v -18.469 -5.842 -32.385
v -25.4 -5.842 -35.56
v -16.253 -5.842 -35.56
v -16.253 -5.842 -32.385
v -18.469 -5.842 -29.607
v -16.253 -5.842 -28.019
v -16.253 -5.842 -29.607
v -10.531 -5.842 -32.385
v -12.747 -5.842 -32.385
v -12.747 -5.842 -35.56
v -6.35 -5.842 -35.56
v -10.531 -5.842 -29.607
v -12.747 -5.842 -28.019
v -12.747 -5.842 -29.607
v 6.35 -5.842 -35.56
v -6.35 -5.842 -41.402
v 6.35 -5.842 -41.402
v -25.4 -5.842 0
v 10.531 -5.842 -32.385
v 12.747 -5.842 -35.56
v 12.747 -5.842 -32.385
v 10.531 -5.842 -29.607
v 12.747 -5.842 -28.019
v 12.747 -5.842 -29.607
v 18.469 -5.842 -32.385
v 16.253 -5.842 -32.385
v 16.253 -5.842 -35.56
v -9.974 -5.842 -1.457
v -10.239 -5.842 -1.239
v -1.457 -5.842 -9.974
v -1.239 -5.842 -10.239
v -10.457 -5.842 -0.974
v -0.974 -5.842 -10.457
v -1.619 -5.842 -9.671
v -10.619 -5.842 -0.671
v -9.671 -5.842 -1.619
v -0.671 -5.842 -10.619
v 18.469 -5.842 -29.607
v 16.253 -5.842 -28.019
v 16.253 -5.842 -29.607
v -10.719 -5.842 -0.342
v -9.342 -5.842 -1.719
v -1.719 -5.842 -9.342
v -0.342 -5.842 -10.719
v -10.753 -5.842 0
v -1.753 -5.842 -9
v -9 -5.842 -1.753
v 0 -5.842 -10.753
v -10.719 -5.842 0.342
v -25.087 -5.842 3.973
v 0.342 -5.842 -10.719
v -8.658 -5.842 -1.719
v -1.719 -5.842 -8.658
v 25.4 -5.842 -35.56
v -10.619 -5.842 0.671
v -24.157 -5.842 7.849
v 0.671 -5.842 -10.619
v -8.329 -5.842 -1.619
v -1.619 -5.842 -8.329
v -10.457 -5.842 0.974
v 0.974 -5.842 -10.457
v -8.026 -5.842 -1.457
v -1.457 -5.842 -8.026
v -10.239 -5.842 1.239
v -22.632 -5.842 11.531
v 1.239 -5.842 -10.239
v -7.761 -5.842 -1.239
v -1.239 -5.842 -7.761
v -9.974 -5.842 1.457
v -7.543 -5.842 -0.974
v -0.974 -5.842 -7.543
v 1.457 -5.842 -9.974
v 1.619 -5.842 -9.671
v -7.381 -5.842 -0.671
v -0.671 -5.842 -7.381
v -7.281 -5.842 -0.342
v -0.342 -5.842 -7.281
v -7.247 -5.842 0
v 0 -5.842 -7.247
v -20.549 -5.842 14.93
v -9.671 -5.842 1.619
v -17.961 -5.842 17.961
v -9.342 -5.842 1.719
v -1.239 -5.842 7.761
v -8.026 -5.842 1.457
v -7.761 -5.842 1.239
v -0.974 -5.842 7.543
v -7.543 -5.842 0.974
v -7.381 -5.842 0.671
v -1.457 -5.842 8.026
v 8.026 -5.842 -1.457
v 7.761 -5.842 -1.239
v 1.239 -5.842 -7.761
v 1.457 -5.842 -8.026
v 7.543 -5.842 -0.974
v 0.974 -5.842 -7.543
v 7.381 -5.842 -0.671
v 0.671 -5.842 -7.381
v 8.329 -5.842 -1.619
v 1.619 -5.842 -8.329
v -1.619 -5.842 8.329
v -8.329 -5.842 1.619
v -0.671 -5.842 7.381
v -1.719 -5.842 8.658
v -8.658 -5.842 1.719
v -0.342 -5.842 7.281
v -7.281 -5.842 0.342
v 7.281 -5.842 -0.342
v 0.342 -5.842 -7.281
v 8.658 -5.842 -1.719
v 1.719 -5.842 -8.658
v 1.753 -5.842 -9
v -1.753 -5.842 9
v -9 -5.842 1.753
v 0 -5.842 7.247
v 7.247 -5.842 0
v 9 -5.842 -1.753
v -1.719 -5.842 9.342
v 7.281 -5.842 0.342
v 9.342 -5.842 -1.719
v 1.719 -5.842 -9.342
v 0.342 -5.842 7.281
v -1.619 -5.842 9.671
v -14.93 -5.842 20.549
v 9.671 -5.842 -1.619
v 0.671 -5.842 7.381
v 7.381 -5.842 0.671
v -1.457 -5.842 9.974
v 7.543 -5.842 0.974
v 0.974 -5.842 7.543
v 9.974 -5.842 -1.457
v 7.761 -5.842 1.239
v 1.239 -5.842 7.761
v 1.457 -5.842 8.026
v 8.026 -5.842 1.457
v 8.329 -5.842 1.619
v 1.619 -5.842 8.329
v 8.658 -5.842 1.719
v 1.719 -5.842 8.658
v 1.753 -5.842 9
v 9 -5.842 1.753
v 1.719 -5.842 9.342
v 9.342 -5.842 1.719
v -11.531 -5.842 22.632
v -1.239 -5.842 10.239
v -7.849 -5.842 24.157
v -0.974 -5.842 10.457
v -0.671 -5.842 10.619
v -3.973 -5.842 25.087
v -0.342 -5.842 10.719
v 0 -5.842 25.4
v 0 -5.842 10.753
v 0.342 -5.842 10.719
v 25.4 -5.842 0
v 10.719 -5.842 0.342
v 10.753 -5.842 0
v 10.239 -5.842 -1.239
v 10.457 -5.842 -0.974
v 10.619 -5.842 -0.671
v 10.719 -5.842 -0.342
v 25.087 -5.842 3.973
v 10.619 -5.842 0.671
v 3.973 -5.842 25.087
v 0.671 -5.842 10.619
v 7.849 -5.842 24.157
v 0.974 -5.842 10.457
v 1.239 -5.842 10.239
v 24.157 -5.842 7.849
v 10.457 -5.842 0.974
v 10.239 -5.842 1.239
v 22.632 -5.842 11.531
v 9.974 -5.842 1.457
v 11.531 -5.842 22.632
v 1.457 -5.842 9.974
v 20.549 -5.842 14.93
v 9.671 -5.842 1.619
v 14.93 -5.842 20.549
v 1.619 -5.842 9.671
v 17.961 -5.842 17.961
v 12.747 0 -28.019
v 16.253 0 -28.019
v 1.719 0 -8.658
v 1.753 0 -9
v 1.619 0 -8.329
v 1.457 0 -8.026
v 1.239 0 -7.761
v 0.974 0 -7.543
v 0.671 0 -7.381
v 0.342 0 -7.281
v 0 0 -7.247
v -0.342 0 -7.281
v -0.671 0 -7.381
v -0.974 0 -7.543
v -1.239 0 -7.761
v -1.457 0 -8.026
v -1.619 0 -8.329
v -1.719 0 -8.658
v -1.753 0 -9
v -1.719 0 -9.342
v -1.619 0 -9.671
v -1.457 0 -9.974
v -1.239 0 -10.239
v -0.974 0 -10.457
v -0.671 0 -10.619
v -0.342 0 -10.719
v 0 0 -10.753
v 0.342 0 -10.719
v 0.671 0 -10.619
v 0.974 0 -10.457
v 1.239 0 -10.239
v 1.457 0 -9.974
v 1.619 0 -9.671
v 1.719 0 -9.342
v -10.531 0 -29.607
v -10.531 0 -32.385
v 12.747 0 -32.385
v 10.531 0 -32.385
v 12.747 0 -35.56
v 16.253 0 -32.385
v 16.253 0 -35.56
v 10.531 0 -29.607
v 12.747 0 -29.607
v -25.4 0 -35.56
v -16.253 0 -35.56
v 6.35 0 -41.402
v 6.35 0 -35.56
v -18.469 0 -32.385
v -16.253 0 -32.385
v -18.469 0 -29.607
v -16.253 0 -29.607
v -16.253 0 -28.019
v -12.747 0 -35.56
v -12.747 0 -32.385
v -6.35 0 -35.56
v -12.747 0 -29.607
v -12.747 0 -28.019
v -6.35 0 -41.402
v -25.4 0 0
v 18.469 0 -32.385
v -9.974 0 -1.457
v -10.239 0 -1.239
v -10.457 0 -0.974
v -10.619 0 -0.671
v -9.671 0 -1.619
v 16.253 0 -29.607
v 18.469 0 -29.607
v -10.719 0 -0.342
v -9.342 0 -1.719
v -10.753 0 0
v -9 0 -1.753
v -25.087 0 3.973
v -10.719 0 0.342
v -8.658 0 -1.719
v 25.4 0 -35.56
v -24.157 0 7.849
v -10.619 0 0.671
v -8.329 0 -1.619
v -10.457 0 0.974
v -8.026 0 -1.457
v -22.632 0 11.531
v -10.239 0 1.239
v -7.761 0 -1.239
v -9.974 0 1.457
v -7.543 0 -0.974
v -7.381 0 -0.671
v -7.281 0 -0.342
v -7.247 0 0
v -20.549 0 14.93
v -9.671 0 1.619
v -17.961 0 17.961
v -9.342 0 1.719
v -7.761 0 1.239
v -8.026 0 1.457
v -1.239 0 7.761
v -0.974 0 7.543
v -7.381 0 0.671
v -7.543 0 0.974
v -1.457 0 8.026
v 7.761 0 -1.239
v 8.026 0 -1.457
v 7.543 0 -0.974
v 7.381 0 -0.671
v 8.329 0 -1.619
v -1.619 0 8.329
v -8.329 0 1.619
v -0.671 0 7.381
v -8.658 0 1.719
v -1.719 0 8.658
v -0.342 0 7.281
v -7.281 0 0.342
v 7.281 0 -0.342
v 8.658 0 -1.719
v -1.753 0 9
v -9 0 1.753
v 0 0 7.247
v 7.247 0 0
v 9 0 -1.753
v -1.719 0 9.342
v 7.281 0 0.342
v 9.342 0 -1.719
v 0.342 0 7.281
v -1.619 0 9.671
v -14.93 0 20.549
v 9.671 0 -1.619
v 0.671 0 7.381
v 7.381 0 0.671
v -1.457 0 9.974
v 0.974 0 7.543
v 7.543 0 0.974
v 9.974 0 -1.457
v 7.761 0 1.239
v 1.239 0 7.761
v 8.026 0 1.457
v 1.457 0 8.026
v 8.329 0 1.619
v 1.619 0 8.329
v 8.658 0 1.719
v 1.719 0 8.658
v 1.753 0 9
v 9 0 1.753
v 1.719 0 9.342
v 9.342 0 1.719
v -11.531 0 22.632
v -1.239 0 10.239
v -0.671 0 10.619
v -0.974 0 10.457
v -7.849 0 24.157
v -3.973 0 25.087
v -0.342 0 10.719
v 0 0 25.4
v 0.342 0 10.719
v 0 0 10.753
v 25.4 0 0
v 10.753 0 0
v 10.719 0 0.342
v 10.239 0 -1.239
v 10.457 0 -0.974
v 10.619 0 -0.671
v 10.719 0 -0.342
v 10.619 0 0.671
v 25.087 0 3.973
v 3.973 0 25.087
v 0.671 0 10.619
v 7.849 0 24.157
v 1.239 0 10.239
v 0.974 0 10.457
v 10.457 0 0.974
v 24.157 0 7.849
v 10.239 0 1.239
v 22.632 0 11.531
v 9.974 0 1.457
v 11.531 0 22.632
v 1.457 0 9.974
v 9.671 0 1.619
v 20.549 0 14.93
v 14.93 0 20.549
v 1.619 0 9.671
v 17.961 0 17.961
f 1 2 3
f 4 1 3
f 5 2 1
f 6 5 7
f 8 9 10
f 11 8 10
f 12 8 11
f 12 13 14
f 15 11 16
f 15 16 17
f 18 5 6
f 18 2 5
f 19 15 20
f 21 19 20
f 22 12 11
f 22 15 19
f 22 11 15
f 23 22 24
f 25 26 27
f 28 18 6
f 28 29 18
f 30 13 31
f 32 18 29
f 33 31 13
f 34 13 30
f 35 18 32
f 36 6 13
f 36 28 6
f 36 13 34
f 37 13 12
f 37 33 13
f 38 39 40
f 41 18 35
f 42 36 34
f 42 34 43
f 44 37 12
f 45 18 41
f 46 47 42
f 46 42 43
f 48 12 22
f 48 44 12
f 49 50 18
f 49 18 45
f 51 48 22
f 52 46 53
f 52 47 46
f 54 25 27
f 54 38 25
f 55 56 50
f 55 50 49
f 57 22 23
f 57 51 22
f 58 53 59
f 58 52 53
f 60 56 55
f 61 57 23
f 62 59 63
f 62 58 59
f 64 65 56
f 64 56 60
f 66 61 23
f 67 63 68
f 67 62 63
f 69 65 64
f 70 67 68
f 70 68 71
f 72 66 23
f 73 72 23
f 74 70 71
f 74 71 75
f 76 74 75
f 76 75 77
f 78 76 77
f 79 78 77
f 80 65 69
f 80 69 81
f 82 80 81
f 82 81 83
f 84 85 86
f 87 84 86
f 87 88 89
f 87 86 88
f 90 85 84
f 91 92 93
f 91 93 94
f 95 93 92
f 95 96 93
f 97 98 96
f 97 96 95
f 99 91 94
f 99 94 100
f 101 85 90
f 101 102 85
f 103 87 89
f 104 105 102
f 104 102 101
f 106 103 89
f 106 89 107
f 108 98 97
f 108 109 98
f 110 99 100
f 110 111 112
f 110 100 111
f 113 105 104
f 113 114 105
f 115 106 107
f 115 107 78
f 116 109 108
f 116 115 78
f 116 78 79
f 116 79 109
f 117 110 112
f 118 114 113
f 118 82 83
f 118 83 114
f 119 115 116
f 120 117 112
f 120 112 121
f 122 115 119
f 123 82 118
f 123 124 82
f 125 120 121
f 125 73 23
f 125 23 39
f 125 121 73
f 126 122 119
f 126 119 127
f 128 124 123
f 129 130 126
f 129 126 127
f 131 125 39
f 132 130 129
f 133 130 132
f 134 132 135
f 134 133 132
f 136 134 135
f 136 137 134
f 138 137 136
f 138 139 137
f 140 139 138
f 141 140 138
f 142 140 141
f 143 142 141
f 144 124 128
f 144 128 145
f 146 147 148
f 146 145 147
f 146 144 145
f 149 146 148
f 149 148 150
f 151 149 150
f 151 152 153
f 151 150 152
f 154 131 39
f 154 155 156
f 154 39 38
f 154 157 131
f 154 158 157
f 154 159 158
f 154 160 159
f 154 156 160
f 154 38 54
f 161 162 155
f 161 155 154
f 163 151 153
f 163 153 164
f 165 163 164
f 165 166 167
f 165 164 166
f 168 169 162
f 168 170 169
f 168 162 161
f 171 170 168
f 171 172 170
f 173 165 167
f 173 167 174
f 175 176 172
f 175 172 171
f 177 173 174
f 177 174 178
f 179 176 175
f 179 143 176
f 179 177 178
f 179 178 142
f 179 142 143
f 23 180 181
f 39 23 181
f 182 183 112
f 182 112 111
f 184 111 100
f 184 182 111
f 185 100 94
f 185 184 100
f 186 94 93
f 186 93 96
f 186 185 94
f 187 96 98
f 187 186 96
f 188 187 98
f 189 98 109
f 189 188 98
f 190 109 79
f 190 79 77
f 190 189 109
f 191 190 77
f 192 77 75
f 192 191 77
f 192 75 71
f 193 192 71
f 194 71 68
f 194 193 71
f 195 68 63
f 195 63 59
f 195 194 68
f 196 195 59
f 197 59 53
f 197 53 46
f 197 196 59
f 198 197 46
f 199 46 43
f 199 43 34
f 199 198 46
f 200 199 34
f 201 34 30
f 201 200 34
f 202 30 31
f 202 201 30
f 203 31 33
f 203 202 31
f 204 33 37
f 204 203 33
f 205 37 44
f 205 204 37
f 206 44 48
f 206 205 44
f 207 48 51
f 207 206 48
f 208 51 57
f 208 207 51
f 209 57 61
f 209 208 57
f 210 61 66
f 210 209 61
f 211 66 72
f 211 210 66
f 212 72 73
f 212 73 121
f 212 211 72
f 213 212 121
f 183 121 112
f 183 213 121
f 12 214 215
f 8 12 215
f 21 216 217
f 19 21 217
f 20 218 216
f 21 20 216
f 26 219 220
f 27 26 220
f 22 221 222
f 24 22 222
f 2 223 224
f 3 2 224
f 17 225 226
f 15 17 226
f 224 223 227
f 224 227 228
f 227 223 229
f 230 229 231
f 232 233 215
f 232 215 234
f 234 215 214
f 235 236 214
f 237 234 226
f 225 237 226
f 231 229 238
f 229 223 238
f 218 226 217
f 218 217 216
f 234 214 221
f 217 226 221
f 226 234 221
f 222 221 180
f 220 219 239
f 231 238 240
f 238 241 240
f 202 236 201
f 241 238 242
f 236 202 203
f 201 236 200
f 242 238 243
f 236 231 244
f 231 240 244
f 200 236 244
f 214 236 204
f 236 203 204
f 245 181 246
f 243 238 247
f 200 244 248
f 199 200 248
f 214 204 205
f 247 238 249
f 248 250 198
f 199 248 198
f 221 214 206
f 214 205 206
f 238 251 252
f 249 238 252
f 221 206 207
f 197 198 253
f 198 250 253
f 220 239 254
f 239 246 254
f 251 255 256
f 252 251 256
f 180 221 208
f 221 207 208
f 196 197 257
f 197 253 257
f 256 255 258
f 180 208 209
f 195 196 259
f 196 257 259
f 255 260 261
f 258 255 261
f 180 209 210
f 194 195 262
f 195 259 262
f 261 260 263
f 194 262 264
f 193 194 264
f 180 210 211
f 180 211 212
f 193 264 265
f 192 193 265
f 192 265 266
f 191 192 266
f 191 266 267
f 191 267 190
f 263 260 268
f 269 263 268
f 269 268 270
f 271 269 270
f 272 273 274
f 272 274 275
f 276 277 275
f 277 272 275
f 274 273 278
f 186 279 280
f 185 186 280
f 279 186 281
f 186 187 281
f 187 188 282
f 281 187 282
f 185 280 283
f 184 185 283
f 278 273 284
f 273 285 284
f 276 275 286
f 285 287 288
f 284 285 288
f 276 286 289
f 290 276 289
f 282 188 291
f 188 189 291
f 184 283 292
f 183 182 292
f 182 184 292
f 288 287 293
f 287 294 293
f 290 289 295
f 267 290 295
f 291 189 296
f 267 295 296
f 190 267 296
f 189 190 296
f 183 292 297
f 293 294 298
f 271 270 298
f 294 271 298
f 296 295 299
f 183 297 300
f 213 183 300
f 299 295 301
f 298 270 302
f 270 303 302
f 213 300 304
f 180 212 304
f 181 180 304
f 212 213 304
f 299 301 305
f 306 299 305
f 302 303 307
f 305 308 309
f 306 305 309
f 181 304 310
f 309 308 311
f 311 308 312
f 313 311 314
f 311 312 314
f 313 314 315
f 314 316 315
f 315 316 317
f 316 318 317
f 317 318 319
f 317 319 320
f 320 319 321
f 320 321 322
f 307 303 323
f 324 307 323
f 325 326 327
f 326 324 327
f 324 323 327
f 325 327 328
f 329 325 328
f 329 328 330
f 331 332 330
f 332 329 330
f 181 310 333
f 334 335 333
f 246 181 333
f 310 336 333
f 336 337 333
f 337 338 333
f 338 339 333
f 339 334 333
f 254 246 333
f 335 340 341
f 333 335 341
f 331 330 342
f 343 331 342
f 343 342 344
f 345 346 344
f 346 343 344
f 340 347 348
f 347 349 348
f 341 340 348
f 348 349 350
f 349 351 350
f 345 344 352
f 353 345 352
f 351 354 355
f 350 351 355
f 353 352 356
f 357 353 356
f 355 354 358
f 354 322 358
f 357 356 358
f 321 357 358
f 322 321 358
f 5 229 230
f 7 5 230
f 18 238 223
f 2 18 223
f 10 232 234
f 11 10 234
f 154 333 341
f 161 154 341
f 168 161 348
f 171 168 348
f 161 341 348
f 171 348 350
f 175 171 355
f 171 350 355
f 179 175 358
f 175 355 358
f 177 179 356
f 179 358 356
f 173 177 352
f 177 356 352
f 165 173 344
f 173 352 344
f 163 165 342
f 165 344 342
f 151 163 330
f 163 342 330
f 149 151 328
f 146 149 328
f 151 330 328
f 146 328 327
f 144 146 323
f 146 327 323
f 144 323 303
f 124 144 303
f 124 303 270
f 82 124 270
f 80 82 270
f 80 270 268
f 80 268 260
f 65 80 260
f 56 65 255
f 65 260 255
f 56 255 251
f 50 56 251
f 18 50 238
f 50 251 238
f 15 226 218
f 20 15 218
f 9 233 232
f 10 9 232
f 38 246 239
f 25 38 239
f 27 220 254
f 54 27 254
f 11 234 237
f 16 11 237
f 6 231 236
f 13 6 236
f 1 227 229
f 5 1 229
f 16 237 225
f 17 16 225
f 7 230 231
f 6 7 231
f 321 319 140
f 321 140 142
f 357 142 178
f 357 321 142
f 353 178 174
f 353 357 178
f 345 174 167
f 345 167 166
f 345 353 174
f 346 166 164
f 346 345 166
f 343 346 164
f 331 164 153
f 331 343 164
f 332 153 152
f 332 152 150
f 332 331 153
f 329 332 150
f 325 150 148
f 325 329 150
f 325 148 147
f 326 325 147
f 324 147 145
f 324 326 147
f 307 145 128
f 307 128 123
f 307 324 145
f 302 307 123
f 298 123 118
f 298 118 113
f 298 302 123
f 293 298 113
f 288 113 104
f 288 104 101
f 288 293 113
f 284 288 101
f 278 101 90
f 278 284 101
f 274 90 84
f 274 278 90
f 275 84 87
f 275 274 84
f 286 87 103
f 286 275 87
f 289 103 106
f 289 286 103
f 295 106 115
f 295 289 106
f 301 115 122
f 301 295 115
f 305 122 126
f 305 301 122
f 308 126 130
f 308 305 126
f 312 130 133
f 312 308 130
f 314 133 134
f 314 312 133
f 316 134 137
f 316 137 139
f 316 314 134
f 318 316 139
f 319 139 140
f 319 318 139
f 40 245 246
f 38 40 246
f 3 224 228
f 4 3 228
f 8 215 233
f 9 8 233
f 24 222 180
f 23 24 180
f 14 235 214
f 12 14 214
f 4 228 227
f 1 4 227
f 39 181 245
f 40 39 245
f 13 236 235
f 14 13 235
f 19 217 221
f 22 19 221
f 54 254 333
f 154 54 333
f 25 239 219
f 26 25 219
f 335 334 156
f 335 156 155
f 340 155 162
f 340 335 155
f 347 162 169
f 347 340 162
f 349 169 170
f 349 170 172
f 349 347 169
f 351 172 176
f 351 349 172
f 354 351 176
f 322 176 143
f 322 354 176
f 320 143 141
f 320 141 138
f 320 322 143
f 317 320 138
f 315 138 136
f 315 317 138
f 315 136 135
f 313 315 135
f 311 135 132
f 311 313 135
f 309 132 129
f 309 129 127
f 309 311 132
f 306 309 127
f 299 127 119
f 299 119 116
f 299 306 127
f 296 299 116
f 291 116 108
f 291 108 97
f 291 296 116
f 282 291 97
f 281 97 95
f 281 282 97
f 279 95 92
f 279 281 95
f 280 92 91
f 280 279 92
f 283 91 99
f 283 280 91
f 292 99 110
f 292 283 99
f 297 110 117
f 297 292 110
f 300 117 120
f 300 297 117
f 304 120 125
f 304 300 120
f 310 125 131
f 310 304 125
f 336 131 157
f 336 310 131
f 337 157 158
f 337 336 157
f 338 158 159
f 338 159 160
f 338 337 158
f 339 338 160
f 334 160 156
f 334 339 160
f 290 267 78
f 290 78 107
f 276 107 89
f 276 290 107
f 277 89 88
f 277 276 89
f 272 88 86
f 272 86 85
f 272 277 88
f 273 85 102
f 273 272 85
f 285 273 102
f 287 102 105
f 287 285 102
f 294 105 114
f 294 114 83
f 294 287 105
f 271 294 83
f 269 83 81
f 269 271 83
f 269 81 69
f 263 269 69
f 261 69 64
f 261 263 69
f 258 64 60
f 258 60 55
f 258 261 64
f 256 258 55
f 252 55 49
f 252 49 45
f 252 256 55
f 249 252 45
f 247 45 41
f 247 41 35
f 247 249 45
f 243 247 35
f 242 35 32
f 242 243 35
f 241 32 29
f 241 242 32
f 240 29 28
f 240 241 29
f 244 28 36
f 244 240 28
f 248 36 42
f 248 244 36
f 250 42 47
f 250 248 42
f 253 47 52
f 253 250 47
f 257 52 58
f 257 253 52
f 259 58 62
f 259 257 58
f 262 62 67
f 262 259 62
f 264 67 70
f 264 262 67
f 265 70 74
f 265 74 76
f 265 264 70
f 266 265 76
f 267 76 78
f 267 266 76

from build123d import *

# Parameters (mm, degrees)
F0_R     = 1.7526
F1_DEPTH = 5.842


with BuildPart() as f1:
    # F0 (on Front) → F1 (new body)
    with BuildSketch(Plane.XZ):
        with BuildLine():
            ThreePointArc((25.4, 0), (0, 25.4), (-25.4, 0))
            Line((-25.4, 0), (-25.4, -35.56))
            Line((-25.4, -35.56), (-16.2526, -35.56))
            Line((-16.2526, -35.56), (-16.2526, -32.385))
            Line((-16.2526, -32.385), (-18.46875, -32.385))
            Line((-18.46875, -32.385), (-18.46875, -29.606875))
            Line((-18.46875, -29.606875), (-16.2526, -29.606875))
            Line((-16.2526, -29.606875), (-16.2526, -28.019375))
            Line((-16.2526, -28.019375), (-12.7474, -28.019375))
            Line((-12.7474, -28.019375), (-12.7474, -29.606875))
            Line((-12.7474, -29.606875), (-10.53125, -29.606875))
            Line((-10.53125, -29.606875), (-10.53125, -32.385))
            Line((-10.53125, -32.385), (-12.7474, -32.385))
            Line((-12.7474, -32.385), (-12.7474, -35.56))
            Line((-12.7474, -35.56), (-6.35, -35.56))
            Line((-6.35, -35.56), (-6.35, -41.402))
            Line((-6.35, -41.402), (6.35, -41.402))
            Line((6.35, -41.402), (6.35, -35.56))
            Line((6.35, -35.56), (12.7474, -35.56))
            Line((12.7474, -35.56), (12.7474, -32.385))
            Line((12.7474, -32.385), (10.53125, -32.385))
            Line((10.53125, -32.385), (10.53125, -29.606875))
            Line((10.53125, -29.606875), (12.7474, -29.606875))
            Line((12.7474, -29.606875), (12.7474, -28.019375))
            Line((12.7474, -28.019375), (16.2526, -28.019375))
            Line((16.2526, -28.019375), (16.2526, -29.606875))
            Line((16.2526, -29.606875), (18.46875, -29.606875))
            Line((18.46875, -29.606875), (18.46875, -32.385))
            Line((18.46875, -32.385), (16.2526, -32.385))
            Line((16.2526, -32.385), (16.2526, -35.56))
            Line((16.2526, -35.56), (25.4, -35.56))
            Line((25.4, -35.56), (25.4, 0))
        make_face()
        with Locations((0, -9)):
            Circle(F0_R, mode=Mode.SUBTRACT)
        with Locations((-9, 0)):
            Circle(F0_R, mode=Mode.SUBTRACT)
        with Locations((0, 9)):
            Circle(F0_R, mode=Mode.SUBTRACT)
        with Locations((9, 0)):
            Circle(F0_R, mode=Mode.SUBTRACT)
    extrude(amount=F1_DEPTH)


solid = f1.part
